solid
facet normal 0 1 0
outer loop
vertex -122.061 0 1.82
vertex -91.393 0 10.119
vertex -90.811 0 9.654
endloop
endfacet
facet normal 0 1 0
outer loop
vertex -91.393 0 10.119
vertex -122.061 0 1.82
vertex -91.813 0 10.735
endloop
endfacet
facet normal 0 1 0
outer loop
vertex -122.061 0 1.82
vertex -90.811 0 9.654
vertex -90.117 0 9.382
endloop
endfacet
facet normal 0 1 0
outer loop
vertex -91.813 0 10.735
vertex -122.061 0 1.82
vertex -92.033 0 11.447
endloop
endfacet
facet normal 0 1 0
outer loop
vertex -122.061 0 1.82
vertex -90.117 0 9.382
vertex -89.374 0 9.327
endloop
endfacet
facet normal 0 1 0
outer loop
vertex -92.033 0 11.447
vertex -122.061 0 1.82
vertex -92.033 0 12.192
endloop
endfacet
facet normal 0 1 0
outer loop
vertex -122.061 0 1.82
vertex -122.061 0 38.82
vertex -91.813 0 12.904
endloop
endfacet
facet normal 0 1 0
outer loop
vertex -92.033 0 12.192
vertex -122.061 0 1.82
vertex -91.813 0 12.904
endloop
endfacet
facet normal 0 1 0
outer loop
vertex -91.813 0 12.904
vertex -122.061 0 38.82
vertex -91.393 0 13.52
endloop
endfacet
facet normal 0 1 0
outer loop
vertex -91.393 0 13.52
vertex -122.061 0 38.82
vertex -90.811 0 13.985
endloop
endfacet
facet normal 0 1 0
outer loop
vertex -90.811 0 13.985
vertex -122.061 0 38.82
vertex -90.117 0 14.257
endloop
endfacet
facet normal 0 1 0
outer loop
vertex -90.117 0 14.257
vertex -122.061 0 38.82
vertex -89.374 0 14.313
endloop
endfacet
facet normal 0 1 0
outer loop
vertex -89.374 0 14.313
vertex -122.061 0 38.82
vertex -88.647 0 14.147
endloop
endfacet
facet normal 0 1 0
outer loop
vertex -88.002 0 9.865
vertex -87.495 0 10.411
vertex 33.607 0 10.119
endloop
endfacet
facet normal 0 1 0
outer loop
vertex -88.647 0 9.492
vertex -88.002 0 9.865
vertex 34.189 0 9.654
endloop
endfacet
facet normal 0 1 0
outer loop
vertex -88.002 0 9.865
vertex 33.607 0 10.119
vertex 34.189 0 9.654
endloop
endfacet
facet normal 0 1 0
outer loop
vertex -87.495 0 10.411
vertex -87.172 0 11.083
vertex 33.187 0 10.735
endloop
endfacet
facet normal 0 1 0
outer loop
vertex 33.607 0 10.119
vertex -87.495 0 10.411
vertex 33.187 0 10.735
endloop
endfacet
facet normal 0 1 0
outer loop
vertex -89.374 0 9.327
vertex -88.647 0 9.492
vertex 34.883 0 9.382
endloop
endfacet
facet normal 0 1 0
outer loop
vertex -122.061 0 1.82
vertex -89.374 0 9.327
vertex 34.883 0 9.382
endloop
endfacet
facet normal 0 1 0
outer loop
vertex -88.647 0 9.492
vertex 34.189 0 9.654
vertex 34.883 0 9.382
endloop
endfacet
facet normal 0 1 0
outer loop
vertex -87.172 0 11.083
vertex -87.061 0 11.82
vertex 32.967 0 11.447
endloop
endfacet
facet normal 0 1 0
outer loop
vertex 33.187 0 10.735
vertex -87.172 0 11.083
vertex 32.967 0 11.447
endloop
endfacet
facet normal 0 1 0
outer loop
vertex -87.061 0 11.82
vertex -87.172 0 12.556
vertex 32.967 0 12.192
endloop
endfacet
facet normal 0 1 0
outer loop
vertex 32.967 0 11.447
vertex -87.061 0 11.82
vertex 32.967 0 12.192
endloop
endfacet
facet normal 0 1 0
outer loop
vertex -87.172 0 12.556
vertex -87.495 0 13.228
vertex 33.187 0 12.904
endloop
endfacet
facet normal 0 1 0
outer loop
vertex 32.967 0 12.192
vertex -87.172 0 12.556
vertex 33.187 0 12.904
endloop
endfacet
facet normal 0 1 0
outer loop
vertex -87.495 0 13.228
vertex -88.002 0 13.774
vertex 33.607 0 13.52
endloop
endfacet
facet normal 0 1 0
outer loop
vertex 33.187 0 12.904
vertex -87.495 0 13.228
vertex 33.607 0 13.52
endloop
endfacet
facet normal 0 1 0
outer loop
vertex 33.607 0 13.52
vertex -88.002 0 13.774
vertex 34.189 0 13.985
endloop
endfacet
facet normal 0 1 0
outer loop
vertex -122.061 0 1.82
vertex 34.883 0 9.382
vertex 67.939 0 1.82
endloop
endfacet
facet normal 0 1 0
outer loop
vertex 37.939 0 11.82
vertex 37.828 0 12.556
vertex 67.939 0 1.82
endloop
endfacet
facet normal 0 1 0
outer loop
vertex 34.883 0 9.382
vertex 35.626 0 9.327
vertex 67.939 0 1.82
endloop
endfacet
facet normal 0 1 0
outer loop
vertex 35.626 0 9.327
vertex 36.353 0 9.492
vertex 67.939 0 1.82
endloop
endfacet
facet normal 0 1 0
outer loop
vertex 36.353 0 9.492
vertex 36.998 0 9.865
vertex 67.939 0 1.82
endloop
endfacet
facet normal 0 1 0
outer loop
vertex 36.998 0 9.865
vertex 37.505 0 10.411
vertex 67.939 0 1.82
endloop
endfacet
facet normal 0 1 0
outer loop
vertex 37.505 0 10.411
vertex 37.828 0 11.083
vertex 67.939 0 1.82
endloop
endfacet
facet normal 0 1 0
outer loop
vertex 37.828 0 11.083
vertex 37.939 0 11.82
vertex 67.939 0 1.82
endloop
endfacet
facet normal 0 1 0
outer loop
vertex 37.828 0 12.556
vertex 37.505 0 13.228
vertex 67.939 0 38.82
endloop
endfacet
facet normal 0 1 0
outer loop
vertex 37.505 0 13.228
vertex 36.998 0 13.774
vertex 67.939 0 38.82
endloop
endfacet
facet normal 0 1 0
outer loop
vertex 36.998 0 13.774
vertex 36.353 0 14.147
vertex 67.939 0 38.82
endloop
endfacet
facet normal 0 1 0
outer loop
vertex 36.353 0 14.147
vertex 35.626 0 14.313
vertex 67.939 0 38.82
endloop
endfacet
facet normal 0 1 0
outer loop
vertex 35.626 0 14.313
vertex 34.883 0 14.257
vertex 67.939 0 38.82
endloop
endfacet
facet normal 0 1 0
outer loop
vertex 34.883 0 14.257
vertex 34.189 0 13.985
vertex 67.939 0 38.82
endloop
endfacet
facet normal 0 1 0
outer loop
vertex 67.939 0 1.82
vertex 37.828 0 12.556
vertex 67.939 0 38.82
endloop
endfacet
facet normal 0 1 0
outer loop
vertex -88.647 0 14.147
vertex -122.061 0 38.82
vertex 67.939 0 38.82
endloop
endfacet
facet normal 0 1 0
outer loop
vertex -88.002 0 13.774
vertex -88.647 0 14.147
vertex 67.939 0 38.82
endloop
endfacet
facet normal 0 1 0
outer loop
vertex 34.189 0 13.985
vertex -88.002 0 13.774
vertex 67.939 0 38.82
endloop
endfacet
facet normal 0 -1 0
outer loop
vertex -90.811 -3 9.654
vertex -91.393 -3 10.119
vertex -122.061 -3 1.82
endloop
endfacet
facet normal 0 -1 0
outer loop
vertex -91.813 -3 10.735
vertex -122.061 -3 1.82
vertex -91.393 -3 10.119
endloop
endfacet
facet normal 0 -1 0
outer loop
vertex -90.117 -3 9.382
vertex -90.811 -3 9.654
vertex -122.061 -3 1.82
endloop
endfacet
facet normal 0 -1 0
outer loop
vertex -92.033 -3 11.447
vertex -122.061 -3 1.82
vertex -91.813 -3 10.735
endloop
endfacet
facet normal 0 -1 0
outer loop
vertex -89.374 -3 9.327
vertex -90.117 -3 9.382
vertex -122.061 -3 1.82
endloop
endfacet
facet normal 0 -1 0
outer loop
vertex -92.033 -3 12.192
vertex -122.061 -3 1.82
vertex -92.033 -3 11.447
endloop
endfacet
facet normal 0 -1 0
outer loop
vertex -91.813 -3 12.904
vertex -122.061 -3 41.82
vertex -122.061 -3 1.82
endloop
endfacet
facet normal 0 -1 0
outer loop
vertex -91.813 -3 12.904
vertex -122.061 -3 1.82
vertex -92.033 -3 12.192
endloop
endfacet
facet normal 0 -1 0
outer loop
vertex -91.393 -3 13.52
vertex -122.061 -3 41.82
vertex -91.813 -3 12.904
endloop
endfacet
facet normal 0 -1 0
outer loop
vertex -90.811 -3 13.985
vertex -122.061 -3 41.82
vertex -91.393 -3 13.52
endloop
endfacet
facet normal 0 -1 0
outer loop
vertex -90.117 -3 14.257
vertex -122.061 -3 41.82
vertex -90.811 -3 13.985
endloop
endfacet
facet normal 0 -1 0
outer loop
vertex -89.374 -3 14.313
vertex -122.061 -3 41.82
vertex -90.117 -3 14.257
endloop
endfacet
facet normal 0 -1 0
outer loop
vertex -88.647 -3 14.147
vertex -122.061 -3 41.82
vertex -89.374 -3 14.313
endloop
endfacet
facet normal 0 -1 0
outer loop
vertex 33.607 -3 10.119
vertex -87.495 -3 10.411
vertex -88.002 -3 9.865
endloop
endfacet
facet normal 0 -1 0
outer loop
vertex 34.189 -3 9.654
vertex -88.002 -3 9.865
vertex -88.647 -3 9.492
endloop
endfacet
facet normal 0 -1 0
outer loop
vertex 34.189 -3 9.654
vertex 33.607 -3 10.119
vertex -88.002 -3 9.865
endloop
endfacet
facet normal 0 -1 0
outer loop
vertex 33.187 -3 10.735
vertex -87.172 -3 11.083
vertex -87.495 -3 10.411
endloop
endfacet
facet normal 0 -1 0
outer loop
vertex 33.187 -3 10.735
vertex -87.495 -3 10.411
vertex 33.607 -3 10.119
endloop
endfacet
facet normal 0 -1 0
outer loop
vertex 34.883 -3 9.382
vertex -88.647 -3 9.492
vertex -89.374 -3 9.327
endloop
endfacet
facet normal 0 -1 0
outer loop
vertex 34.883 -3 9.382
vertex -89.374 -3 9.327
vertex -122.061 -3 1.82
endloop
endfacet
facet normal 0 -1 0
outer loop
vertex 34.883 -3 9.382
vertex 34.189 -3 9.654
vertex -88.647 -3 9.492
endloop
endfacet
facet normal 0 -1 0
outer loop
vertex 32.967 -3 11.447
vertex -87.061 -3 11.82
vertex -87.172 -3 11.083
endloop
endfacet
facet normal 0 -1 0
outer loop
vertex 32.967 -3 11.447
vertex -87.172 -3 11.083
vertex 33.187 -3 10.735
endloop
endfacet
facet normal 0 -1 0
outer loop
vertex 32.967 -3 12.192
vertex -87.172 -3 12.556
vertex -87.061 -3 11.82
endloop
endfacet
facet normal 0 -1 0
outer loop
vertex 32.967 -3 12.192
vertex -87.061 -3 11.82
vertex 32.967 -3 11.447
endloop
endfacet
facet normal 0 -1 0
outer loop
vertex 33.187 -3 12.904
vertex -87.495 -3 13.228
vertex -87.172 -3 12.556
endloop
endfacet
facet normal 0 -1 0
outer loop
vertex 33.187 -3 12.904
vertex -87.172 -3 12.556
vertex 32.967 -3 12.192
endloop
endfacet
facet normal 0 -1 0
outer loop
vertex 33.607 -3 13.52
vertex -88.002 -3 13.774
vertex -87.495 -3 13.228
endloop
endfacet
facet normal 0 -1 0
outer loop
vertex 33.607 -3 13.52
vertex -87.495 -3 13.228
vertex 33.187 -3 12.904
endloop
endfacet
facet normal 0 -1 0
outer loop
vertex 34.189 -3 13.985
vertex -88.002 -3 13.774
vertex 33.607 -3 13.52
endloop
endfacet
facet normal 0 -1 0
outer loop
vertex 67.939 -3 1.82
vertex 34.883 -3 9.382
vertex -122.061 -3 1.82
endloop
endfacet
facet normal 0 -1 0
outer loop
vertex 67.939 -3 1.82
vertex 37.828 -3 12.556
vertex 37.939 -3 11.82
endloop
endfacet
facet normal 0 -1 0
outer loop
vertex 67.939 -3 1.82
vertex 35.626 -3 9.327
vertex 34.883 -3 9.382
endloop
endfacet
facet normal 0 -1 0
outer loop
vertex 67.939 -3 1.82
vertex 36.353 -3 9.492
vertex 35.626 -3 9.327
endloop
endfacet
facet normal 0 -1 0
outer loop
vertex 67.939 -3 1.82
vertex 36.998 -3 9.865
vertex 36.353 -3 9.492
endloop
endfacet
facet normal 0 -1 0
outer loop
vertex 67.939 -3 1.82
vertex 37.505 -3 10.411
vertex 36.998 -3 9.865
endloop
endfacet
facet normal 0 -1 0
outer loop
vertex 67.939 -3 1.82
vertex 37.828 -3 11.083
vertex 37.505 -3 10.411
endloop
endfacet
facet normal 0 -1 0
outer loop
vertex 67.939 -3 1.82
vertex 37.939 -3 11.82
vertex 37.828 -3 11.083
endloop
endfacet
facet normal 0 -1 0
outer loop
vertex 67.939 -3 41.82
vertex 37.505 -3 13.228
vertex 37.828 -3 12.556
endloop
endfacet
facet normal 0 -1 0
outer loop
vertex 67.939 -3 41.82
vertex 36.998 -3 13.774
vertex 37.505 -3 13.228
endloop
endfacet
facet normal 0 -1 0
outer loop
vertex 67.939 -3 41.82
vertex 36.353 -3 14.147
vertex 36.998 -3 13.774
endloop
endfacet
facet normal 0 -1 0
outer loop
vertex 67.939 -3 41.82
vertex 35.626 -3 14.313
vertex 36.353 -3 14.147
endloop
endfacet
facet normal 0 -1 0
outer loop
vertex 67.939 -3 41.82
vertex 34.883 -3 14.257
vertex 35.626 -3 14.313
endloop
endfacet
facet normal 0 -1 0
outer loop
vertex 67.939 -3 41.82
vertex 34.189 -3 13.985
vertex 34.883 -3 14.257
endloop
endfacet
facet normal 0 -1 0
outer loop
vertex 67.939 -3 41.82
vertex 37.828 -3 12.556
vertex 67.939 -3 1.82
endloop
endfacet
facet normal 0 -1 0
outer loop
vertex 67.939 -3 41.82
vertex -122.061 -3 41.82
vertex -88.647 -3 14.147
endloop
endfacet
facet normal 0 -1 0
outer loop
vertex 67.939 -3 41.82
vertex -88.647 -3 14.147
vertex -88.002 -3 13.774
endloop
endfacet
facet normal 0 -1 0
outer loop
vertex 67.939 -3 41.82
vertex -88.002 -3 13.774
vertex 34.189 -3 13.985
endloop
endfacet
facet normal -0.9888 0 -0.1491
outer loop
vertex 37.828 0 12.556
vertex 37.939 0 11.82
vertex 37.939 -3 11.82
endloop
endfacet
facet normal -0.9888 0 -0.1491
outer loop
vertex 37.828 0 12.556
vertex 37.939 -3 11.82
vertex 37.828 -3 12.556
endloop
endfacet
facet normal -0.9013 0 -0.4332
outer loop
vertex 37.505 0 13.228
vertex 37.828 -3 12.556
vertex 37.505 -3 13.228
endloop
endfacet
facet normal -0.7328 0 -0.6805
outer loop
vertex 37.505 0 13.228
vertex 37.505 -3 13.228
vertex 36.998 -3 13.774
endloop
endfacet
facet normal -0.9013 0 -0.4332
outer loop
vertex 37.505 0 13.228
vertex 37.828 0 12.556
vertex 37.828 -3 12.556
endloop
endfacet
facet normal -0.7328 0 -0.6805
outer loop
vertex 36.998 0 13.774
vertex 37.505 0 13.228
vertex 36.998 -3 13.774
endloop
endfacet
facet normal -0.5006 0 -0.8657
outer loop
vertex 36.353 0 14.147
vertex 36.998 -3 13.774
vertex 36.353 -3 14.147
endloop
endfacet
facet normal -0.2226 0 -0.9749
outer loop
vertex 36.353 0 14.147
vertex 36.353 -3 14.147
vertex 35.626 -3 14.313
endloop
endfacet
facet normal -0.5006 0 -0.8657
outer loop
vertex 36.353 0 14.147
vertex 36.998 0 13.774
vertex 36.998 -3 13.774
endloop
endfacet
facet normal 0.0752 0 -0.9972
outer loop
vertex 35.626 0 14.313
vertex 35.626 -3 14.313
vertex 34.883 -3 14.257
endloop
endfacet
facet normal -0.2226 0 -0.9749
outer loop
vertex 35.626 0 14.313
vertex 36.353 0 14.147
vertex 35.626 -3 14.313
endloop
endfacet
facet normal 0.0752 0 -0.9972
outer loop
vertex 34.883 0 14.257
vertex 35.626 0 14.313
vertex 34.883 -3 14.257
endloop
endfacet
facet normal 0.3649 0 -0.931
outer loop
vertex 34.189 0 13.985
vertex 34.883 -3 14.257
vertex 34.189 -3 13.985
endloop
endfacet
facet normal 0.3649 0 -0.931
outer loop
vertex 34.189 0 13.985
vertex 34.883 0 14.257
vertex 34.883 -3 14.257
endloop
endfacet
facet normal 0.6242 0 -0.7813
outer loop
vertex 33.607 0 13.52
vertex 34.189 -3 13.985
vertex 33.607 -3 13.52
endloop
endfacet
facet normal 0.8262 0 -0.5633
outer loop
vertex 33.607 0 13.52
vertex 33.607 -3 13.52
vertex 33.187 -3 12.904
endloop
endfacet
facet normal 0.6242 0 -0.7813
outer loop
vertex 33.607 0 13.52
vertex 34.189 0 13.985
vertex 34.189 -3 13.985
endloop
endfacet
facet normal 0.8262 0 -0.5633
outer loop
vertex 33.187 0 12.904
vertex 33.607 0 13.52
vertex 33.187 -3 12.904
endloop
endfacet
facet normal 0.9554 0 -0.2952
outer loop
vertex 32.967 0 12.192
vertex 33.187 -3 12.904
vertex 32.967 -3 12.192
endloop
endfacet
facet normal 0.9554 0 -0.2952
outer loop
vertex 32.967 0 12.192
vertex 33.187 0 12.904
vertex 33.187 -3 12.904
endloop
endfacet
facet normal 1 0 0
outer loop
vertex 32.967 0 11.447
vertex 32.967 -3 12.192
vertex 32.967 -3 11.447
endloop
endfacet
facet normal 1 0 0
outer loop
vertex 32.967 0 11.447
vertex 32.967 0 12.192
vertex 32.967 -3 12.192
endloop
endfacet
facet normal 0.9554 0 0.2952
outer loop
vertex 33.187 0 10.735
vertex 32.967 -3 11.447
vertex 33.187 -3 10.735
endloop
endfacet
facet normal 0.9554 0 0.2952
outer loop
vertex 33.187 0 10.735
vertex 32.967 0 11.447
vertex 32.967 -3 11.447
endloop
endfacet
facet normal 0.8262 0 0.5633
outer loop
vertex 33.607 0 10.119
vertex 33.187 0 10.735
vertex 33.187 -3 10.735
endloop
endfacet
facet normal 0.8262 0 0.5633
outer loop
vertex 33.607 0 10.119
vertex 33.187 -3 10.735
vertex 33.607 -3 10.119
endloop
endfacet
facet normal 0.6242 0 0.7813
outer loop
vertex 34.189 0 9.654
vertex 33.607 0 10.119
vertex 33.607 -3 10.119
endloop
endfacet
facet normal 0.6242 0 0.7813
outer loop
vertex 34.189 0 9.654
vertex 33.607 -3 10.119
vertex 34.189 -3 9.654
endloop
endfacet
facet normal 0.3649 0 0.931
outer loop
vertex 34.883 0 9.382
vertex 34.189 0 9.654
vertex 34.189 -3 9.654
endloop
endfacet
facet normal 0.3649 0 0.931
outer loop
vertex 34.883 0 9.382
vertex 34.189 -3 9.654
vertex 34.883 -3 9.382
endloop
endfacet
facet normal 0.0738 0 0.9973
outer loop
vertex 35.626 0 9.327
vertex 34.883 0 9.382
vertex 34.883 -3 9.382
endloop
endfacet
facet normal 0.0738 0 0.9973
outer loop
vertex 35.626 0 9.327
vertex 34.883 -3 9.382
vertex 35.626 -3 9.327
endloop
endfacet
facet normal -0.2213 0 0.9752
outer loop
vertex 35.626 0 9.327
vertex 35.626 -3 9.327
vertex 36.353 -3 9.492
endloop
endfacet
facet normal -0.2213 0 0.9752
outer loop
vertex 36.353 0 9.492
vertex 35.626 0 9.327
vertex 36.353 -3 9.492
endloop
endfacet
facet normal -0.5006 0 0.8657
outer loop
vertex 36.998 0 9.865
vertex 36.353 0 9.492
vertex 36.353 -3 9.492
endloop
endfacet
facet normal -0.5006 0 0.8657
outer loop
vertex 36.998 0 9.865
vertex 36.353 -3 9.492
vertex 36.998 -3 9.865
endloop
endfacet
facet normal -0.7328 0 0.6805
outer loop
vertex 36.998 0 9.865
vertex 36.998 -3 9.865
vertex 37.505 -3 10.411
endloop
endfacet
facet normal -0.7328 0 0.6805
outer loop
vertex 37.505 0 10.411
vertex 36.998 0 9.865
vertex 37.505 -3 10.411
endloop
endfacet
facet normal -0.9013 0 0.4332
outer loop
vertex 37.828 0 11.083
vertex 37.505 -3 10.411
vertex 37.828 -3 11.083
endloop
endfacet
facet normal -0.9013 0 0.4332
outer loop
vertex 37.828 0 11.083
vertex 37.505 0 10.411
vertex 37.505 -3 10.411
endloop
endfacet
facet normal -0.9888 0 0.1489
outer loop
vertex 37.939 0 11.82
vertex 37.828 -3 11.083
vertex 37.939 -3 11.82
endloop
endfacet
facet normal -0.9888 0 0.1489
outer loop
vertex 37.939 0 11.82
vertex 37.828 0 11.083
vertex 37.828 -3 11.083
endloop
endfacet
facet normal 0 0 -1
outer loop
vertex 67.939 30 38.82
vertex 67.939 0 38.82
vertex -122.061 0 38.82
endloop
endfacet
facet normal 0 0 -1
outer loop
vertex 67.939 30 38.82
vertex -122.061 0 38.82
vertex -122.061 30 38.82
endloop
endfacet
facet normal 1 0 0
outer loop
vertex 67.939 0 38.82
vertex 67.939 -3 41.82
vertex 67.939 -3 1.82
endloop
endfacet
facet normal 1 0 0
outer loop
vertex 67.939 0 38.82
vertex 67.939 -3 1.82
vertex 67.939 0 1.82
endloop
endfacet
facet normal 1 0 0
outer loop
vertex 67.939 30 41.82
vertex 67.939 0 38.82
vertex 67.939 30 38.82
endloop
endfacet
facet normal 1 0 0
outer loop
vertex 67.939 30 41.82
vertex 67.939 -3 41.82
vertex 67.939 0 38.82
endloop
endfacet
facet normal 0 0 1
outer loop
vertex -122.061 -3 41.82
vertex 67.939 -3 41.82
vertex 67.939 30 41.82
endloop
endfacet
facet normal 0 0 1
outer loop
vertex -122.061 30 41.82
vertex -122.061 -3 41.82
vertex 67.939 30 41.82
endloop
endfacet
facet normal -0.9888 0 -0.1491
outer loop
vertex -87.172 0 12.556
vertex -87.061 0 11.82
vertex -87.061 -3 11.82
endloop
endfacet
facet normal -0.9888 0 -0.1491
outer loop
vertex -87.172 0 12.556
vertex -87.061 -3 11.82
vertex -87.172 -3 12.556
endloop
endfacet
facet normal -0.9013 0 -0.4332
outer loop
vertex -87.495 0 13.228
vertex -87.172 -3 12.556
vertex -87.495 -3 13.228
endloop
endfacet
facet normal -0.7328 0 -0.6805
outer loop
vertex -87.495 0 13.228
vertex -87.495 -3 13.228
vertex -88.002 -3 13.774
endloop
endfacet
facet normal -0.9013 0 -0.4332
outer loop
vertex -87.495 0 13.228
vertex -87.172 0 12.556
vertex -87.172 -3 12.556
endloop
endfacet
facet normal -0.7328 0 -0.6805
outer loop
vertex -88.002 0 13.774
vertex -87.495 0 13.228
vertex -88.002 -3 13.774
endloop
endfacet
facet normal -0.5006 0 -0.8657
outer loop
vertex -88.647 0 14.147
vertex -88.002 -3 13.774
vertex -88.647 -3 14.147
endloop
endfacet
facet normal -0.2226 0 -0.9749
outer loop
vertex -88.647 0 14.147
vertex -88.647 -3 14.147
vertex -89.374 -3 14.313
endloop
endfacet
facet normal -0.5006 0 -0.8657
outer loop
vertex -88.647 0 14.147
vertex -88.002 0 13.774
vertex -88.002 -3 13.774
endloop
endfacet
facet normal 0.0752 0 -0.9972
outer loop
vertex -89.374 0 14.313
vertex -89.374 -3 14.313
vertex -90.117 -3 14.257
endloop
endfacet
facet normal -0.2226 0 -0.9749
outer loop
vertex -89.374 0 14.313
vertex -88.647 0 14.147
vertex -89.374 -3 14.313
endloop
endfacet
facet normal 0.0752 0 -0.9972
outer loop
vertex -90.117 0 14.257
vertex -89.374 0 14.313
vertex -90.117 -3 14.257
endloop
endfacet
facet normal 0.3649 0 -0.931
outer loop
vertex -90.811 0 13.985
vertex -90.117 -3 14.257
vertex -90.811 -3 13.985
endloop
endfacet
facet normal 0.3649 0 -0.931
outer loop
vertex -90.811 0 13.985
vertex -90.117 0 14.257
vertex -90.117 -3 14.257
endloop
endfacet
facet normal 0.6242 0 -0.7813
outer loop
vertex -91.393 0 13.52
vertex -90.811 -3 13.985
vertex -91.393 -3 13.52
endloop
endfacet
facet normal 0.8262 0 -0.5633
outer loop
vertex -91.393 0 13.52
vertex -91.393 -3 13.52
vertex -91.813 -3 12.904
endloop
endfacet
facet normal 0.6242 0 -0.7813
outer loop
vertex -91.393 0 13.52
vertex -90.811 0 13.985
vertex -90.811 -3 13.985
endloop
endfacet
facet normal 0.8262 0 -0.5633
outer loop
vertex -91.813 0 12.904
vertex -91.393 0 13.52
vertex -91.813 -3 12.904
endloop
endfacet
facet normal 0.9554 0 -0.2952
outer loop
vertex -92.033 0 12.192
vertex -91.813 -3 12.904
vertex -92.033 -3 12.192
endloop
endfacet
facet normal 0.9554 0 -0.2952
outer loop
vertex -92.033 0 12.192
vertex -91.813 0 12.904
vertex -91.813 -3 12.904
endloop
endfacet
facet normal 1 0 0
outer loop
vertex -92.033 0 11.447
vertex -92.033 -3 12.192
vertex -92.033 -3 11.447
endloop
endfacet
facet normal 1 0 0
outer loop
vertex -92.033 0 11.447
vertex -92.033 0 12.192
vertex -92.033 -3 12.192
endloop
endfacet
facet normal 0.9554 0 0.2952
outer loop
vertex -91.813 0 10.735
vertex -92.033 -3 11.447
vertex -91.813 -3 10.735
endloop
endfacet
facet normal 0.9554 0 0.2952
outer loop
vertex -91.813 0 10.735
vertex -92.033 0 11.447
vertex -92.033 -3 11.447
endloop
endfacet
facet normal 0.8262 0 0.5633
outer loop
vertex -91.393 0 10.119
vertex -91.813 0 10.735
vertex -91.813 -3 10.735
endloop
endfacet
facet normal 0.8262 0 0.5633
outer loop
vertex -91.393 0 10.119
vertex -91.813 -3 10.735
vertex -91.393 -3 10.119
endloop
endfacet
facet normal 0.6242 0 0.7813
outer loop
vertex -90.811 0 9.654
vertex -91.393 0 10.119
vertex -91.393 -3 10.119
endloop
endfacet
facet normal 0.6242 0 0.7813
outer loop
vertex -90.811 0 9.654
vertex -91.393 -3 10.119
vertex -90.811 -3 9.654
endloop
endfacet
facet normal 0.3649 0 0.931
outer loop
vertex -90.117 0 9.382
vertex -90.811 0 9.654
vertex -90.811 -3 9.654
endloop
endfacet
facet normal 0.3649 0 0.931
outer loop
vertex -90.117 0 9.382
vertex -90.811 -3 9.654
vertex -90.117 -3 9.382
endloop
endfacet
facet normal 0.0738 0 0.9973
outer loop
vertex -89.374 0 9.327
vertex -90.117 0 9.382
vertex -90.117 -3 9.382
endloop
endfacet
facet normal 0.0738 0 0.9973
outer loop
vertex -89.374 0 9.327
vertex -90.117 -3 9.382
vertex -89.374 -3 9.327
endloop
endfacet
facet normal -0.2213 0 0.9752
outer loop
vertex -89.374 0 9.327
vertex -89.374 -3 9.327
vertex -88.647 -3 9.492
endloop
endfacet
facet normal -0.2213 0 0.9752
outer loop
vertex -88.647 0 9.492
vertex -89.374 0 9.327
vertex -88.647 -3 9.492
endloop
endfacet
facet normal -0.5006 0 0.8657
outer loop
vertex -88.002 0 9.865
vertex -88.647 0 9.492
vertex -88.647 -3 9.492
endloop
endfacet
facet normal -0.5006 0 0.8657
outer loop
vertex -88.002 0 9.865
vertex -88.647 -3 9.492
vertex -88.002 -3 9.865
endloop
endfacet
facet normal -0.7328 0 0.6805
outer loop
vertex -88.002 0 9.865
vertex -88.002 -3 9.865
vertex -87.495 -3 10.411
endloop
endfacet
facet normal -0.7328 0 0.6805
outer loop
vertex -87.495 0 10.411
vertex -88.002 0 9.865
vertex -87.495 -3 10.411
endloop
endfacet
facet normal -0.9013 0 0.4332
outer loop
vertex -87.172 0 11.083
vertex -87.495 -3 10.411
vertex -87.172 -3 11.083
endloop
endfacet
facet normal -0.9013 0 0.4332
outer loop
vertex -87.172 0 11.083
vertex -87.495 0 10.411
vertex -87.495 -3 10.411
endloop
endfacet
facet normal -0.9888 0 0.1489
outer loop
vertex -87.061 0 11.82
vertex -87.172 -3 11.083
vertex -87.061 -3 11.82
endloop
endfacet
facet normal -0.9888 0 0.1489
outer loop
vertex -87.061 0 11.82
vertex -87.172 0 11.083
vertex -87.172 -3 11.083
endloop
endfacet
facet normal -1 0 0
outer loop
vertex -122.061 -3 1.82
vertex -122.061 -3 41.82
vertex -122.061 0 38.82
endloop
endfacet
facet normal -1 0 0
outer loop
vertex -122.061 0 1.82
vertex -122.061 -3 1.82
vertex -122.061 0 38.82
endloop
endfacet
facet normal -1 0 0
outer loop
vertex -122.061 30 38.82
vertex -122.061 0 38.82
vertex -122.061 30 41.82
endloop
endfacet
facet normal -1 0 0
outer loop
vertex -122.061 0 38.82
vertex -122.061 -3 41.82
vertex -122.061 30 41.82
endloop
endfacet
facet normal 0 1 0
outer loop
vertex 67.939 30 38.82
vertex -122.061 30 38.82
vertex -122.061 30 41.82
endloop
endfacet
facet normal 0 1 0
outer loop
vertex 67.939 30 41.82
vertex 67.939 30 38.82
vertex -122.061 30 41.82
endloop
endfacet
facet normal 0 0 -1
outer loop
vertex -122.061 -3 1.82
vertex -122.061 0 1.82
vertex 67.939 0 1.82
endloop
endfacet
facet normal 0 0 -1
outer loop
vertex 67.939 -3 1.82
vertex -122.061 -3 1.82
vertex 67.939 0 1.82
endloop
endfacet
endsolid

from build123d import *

# Parameters (mm, degrees)
F0_W     = 190
F0_H     = 40
F0_R     = 2.5
F1_DEPTH = 3
F2_W     = 30
F2_H     = 3
F3_DEPTH = 190


with BuildPart() as f1:
    # F0 (on Front) → F1 (new body)
    with BuildSketch(Plane.XZ):
        with Locations((-27.060809, 21.819512)):
            Rectangle(F0_W, F0_H)
        with Locations((-89.560809, 11.819512)):
            Circle(F0_R, mode=Mode.SUBTRACT)
        with Locations((35.439191, 11.819512)):
            Circle(F0_R, mode=Mode.SUBTRACT)
    extrude(amount=F1_DEPTH)

    # F2 (on face) → F3 (join, through all)
    with BuildSketch(Plane.YZ.offset(67.939191)):
        with Locations((15, 40.319512)):
            Rectangle(F2_W, F2_H)
    extrude(amount=-F3_DEPTH)


solid = f1.part
